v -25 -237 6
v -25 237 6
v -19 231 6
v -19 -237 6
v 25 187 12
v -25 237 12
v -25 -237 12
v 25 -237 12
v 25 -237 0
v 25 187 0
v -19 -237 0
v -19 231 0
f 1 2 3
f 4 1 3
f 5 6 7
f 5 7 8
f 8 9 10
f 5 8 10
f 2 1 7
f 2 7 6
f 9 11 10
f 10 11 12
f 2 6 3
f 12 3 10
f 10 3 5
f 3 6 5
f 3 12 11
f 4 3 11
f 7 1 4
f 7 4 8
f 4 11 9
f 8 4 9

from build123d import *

# Parameters (mm, degrees)
F0_W     = 50
F0_H     = 474
F1_DEPTH = 12
F2_W     = 6
F2_H     = 474
F3_DEPTH = 6
F5_DEPTH = 12


with BuildPart() as f1:
    # F0 (on Top) → F1 (new body)
    with BuildSketch(Plane.XY):
        Rectangle(F0_W, F0_H)
    extrude(amount=F1_DEPTH)

    # F2 (on face) → F3 (cut)
    with BuildSketch(Plane(origin=(0, 0, 0), x_dir=(1, 0, 0), z_dir=(0, 0, -1))):
        with Locations((-22, 0)):
            Rectangle(F2_W, F2_H)
    extrude(amount=-F3_DEPTH, mode=Mode.SUBTRACT)

    # F4 (on face) → F5 (cut, through all)
    with BuildSketch(Plane.XY.offset(12)):
        Polygon((25, 237), (-25, 237), (25, 187), align=None)
    extrude(amount=-F5_DEPTH, mode=Mode.SUBTRACT)


solid = f1.part
